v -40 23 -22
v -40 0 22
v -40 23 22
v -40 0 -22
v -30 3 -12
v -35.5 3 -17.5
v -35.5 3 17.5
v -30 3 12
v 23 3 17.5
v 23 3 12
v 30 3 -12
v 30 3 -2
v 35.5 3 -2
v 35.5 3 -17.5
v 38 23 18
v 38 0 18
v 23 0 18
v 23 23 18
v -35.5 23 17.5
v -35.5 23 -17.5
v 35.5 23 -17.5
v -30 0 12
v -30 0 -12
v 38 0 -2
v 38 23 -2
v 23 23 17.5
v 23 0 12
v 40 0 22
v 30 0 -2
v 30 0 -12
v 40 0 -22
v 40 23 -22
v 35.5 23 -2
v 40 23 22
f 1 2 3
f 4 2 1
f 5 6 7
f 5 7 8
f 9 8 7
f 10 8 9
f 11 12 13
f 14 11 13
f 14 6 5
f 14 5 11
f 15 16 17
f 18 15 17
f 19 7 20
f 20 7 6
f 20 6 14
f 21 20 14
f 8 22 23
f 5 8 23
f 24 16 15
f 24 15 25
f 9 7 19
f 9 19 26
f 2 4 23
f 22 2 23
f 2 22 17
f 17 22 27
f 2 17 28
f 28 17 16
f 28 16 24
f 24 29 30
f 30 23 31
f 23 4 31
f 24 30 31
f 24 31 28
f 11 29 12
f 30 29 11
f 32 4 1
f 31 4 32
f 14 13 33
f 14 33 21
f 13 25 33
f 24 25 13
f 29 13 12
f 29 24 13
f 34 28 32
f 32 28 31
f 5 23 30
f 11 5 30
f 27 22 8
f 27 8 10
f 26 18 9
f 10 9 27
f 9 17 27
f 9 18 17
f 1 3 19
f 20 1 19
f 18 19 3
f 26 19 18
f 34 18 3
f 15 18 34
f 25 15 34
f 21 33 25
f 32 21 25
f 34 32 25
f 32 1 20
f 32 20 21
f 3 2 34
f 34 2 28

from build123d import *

# Parameters (mm, degrees)
SKETCH1_W           = 80
SKETCH1_H           = 44
SKETCH1_W_2         = 60
SKETCH1_H_2         = 24
BOSS_EXTRUDE1_DEPTH = 3
SKETCH2_W           = 80
SKETCH2_H           = 44
SKETCH2_W_2         = 71
SKETCH2_H_2         = 35
BOSS_EXTRUDE2_DEPTH = 20
CUT_EXTRUDE1_REACH  = 53.118
SKETCH3_W           = 15
SKETCH3_H           = 20


with BuildPart() as part:
    # Sketch1 → Boss-Extrude1 (new body)
    with BuildSketch(Plane(origin=(0, 0, 0), x_dir=(1, 0, 0), z_dir=(0, 1, 0))):
        Rectangle(SKETCH1_W, SKETCH1_H)
        Rectangle(SKETCH1_W_2, SKETCH1_H_2, mode=Mode.SUBTRACT)
    extrude(amount=BOSS_EXTRUDE1_DEPTH)

    # Sketch2 → Boss-Extrude2 (add)
    with BuildSketch(Plane(origin=(0, 3, 0), x_dir=(1, 0, 0), z_dir=(0, 1, 0))):
        Rectangle(SKETCH2_W, SKETCH2_H)
        Rectangle(SKETCH2_W_2, SKETCH2_H_2, mode=Mode.SUBTRACT)
    extrude(amount=BOSS_EXTRUDE2_DEPTH)

    # Sketch3 → Cut-Extrude1 (cut, up to next)
    with BuildSketch(Plane(origin=(0, 0, 0), x_dir=(-1, 0, 0), z_dir=(0, -1, 0)), mode=Mode.PRIVATE) as cut_extrude1_sk1:
        with Locations((-30.5, -8)):
            Rectangle(SKETCH3_W, SKETCH3_H)
    cut_extrude1_tool1 = extrude(cut_extrude1_sk1.sketch, amount=-CUT_EXTRUDE1_REACH, mode=Mode.PRIVATE) & part.part
    add(cut_extrude1_tool1.solids().sort_by_distance((30.5, 0, 8))[0], mode=Mode.SUBTRACT)


solid = part.part
